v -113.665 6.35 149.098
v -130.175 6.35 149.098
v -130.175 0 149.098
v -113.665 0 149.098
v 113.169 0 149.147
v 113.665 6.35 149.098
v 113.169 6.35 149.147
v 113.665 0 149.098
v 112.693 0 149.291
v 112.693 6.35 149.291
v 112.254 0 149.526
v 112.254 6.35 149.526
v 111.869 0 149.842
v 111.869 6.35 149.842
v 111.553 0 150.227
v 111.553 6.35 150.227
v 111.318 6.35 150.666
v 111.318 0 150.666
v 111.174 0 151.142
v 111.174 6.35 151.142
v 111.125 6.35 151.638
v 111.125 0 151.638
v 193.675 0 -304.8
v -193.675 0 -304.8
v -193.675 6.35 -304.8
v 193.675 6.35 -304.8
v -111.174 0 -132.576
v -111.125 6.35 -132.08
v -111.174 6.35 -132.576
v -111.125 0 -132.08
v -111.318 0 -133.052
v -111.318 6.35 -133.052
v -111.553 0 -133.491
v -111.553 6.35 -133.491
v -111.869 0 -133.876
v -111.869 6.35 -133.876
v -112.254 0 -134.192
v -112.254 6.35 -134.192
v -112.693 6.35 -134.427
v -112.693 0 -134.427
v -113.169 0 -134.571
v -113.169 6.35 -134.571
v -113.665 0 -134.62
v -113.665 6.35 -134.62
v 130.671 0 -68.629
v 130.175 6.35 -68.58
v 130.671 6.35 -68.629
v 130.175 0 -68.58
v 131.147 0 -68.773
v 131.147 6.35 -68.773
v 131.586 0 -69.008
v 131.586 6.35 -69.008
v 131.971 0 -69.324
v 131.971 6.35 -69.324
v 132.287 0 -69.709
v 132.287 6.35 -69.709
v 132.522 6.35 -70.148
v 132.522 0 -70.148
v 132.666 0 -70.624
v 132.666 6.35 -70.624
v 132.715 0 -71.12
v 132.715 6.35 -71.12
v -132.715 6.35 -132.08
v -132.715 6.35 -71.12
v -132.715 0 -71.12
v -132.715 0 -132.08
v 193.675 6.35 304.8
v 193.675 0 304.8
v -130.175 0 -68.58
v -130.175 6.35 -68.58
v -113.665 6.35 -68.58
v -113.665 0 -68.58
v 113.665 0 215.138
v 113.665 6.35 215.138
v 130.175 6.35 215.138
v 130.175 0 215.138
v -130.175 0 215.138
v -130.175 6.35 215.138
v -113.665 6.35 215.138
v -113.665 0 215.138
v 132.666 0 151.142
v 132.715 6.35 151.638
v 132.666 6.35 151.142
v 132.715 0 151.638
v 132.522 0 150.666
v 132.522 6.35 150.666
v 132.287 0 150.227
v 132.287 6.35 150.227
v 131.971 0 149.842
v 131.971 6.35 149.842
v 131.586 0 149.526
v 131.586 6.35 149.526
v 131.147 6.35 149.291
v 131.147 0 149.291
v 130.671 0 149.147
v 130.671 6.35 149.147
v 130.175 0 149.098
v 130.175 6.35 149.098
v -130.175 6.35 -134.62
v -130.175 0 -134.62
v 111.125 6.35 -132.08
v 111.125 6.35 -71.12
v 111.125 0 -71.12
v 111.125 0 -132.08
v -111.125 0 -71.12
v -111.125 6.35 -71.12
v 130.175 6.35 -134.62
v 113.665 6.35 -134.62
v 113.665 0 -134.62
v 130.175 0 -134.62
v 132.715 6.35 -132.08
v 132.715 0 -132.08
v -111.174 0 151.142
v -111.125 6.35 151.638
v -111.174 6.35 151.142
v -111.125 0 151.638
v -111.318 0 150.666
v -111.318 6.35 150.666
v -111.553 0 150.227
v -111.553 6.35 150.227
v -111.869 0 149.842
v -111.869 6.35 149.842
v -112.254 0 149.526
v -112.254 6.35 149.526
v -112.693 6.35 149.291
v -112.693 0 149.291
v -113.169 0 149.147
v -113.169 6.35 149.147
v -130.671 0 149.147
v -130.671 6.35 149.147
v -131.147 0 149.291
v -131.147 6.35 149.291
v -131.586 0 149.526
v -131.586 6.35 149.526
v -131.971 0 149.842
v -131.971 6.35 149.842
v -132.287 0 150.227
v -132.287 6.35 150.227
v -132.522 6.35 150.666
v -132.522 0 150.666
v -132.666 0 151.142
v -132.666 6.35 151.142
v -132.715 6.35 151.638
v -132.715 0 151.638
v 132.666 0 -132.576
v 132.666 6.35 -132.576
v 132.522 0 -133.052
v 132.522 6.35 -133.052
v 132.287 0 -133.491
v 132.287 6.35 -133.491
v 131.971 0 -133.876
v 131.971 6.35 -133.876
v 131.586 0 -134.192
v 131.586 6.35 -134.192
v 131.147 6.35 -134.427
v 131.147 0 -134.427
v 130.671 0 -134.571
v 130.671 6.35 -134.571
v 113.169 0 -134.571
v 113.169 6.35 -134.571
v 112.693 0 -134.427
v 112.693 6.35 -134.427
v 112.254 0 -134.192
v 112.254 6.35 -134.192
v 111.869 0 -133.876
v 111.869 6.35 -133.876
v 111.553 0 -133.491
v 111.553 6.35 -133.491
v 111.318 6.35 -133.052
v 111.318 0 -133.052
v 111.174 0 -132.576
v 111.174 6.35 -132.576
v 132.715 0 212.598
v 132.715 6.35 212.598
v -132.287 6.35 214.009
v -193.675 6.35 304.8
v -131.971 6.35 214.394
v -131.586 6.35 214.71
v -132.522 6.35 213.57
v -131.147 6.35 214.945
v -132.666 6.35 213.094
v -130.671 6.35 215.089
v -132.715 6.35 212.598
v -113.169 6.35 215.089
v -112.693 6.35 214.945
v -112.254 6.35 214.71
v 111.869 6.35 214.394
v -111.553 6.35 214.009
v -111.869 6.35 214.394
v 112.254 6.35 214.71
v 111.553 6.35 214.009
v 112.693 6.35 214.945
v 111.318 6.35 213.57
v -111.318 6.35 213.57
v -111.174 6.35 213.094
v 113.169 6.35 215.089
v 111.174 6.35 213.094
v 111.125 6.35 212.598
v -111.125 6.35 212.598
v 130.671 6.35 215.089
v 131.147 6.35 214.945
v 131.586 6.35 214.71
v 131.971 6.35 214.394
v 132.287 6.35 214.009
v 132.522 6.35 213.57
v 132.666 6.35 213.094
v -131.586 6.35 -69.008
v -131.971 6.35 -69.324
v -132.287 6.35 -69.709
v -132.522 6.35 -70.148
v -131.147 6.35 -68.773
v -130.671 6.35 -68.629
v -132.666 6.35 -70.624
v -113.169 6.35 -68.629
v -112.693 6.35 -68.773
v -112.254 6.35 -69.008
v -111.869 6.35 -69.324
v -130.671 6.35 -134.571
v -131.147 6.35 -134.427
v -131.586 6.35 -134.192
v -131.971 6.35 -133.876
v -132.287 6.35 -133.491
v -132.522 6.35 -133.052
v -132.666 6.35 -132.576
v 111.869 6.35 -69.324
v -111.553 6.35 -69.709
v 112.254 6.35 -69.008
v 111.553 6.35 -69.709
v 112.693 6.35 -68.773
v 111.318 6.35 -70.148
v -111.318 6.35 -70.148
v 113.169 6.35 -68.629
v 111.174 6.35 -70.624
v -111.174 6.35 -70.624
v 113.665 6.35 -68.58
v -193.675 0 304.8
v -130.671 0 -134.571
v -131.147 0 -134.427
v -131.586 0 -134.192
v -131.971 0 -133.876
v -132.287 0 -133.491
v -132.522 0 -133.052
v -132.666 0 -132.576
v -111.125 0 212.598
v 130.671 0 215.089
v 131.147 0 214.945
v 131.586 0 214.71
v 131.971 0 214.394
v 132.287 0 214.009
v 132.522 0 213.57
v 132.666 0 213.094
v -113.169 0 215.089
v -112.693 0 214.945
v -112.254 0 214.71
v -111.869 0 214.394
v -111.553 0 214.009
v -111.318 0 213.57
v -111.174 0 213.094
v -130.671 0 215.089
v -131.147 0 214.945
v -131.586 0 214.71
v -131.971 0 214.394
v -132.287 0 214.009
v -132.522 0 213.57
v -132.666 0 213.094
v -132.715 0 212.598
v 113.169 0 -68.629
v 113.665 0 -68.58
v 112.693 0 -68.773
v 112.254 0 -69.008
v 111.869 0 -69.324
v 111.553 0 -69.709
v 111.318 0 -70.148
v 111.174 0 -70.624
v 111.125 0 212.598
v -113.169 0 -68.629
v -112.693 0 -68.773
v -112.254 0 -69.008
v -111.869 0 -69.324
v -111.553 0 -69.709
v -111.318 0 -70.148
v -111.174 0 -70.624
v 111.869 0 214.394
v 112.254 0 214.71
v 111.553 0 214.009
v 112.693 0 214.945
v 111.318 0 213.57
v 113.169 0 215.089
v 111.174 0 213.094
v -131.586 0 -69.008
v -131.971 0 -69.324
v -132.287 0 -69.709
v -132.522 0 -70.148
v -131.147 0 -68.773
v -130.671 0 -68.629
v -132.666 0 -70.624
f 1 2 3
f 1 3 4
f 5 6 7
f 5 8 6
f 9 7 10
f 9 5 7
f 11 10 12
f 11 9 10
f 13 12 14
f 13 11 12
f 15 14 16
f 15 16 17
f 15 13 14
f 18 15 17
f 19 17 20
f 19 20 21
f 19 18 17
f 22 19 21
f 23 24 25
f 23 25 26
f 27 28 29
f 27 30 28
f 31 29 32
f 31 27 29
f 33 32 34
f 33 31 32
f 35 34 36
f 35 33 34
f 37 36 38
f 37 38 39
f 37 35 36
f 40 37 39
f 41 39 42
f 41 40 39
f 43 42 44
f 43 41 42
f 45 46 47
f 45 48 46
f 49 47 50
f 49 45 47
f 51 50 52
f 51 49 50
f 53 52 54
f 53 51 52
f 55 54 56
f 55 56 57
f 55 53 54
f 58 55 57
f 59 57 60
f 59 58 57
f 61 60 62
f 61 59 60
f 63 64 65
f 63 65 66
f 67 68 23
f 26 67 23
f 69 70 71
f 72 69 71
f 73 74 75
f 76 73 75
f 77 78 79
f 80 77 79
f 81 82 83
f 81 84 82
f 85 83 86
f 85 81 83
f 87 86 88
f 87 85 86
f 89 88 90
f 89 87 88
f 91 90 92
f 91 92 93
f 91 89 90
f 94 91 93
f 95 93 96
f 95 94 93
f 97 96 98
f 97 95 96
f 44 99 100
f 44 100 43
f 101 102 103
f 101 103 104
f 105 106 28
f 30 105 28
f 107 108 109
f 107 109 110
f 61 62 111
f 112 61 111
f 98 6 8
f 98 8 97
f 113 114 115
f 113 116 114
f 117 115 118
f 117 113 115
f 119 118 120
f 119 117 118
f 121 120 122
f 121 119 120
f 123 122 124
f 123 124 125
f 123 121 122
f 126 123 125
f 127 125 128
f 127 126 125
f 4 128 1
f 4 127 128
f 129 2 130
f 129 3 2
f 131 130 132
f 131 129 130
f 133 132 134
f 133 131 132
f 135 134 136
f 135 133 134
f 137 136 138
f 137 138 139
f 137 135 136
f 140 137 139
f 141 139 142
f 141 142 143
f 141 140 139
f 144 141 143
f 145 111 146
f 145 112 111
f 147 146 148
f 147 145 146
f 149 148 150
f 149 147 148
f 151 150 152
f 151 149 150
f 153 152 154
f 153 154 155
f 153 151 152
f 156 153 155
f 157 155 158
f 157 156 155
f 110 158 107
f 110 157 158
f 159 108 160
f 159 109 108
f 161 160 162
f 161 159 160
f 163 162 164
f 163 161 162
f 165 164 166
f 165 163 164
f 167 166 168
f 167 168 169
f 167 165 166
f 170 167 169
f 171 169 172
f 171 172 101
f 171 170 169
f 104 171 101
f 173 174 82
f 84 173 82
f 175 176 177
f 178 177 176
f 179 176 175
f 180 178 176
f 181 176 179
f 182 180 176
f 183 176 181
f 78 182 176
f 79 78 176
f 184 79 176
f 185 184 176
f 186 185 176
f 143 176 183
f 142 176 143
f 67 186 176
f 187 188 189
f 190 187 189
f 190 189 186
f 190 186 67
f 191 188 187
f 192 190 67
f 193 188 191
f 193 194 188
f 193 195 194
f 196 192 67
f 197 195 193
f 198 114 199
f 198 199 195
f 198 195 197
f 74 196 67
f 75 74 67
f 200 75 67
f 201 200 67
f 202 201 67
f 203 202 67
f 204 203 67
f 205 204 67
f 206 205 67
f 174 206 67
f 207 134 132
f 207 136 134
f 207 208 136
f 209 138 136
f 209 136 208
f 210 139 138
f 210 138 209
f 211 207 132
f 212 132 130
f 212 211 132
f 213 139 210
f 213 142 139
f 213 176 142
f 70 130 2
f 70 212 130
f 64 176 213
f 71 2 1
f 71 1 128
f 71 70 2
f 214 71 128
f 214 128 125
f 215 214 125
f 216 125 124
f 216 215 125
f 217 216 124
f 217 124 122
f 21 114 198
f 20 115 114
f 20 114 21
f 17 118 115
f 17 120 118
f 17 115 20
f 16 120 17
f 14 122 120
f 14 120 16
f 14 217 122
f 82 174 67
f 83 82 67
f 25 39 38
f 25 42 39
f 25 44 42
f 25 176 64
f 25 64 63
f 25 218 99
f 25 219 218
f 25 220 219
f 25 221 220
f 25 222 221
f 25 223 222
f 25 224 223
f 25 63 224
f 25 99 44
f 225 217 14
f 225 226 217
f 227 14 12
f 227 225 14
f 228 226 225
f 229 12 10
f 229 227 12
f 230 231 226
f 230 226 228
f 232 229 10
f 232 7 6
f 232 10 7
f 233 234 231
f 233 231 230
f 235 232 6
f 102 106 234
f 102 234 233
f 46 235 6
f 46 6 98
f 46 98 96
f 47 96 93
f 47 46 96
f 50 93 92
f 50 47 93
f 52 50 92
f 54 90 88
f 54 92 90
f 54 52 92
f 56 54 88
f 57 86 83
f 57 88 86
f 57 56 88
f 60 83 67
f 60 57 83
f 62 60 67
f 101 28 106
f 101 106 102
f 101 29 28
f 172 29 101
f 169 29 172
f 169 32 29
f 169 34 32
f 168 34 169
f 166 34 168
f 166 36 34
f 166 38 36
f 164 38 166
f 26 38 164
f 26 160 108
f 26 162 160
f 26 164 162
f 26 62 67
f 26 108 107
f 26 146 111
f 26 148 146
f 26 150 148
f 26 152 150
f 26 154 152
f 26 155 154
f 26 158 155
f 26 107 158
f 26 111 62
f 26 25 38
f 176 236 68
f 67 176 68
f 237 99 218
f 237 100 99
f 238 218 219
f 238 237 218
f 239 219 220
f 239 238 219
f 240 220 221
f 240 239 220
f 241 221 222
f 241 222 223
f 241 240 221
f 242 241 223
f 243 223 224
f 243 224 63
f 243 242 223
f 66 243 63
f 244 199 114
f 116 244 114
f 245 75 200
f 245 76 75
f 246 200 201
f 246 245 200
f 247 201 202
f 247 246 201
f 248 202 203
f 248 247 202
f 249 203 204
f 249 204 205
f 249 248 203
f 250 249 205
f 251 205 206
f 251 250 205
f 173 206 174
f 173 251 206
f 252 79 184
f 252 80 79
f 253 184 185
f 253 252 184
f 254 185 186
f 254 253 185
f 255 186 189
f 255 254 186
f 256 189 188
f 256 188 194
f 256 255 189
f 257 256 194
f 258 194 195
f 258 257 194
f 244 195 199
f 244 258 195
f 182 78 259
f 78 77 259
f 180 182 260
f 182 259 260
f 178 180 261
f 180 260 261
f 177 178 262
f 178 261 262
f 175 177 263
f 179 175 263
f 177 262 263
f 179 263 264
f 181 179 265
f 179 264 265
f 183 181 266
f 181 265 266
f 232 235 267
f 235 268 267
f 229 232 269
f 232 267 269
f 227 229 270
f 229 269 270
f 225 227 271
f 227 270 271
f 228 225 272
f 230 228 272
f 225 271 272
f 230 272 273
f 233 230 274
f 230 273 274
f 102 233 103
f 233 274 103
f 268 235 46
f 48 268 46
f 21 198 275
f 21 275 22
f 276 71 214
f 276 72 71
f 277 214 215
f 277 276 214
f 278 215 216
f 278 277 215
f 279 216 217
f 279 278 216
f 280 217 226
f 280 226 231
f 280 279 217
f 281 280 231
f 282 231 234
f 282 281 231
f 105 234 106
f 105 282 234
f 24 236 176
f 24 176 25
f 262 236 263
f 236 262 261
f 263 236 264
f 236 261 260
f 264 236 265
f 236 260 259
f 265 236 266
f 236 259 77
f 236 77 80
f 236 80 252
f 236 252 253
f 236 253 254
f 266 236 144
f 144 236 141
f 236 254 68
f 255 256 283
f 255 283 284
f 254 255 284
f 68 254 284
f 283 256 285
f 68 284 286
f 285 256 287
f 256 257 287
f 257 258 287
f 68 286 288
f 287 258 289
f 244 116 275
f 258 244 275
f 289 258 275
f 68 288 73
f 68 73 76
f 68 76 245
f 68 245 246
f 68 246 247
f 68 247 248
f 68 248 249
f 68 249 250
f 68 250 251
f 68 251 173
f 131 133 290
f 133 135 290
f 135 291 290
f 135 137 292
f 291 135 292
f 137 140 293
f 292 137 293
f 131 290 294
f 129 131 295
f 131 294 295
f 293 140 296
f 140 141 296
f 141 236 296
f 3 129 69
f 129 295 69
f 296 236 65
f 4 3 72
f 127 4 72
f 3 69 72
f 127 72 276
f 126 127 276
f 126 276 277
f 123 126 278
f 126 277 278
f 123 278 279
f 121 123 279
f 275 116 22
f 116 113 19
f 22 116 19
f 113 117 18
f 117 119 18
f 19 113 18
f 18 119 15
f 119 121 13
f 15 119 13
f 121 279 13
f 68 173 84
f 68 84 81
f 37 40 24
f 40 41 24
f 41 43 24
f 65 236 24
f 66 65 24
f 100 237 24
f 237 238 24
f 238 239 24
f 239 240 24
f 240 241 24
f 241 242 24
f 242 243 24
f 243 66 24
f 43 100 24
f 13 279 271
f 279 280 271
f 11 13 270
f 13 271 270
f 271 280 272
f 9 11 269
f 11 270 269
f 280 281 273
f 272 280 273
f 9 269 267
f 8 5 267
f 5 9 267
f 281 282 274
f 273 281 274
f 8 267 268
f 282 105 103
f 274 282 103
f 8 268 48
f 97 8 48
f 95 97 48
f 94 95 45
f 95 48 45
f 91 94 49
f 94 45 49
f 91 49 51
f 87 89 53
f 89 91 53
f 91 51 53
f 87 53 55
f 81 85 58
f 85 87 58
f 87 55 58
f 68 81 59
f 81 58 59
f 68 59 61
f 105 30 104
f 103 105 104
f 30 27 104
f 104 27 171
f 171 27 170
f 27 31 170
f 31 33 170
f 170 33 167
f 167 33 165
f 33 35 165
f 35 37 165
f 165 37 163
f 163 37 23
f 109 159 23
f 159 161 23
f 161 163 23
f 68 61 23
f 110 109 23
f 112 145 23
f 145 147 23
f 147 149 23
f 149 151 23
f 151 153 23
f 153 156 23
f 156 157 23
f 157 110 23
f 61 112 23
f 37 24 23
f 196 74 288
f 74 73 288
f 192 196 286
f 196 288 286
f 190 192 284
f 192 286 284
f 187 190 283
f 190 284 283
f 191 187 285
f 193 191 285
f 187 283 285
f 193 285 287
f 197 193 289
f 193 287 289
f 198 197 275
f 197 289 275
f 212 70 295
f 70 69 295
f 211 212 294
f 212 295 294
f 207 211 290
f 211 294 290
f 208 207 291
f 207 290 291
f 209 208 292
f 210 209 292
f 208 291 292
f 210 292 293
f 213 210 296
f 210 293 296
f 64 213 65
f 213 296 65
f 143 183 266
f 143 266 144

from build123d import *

# Parameters (mm, degrees)
SKETCH1_W           = 387.35
SKETCH1_H           = 609.6
BOSS_EXTRUDE1_DEPTH = 6.35
SKETCH2_W           = 21.59
SKETCH2_H           = 66.04
CUT_EXTRUDE1_DEPTH  = 362.183288823
FILLET1_R           = 2.54


with BuildPart() as part:
    # Sketch1 → Boss-Extrude1 (new body)
    with BuildSketch(Plane(origin=(0, 0, 0), x_dir=(1, 0, 0), z_dir=(0, 1, 0))):
        Rectangle(SKETCH1_W, SKETCH1_H)
    extrude(amount=BOSS_EXTRUDE1_DEPTH)

    # Sketch2 → Cut-Extrude1 (cut, through all)
    with BuildSketch(Plane(origin=(0, 6.35, 0), x_dir=(1, 0, 0), z_dir=(0, 1, 0))):
        with Locations((121.92, -182.118)):
            Rectangle(SKETCH2_W, SKETCH2_H)
        with Locations((121.92, 101.6)):
            Rectangle(SKETCH2_W, SKETCH2_H)
        with Locations((-121.92, -182.118)):
            Rectangle(SKETCH2_W, SKETCH2_H)
        with Locations((-121.92, 101.6)):
            Rectangle(SKETCH2_W, SKETCH2_H)
    extrude(amount=-CUT_EXTRUDE1_DEPTH, mode=Mode.SUBTRACT)

    # Fillet1
    fillet1_edges = [part.edges().sort_by_distance(p)[0] for p in [
        (132.715, 3.175, -134.62),
        (132.715, 3.175, -68.58),
        (111.125, 3.175, -68.58),
        (111.125, 3.175, -134.62),
        (-111.125, 3.175, 215.138),
        (-132.715, 3.175, 215.138),
        (-132.715, 3.175, 149.098),
        (-111.125, 3.175, 149.098),
        (-111.125, 3.175, -68.58),
        (-132.715, 3.175, -68.58),
        (-132.715, 3.175, -134.62),
        (-111.125, 3.175, -134.62),
        (132.715, 3.175, 149.098),
        (132.715, 3.175, 215.138),
        (111.125, 3.175, 215.138),
        (111.125, 3.175, 149.098),
    ]]
    fillet(fillet1_edges, radius=FILLET1_R)


solid = part.part
